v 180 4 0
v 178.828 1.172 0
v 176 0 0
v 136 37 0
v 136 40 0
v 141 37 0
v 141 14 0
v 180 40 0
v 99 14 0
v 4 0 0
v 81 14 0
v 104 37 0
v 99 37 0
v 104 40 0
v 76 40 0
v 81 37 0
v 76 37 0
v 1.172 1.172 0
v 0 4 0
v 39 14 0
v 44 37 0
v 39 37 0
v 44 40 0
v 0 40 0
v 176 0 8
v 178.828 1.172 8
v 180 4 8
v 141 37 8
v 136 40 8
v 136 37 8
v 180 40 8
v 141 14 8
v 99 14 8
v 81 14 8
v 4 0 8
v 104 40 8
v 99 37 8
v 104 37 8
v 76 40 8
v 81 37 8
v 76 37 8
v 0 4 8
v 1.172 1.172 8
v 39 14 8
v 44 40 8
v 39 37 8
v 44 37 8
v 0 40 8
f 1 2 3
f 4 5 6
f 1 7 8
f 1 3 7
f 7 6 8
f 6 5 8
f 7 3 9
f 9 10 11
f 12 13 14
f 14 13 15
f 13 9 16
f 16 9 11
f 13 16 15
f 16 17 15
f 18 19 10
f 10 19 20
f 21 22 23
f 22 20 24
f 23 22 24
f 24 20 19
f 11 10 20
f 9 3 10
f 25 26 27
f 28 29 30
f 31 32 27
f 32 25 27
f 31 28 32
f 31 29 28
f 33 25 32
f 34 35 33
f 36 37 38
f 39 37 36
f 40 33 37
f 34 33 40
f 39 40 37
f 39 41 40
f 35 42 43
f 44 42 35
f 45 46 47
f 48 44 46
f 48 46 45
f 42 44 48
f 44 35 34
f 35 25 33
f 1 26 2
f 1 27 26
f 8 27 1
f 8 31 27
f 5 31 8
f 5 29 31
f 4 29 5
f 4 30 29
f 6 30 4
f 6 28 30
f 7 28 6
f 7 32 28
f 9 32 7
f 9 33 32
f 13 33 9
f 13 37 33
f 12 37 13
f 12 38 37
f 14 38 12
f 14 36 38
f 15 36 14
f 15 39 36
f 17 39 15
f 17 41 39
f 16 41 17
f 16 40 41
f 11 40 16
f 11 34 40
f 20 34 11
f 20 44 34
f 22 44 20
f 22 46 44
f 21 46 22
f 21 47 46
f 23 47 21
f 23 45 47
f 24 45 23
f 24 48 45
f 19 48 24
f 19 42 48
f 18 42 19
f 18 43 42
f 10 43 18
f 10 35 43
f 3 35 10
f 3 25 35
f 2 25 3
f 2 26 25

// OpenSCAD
$fn = 32;

// ----------------------------------------------------------------------
// Oversize slot bar: 180 mm bar with 2 oversize windows
// ----------------------------------------------------------------------

// --- parameters (mm) ---
profile_height = 8;       // extrusion height
profile_points = 24;      // points of the closed outline

profile = [[0, 4], [1.172, 1.172], [4, 0], [176, 0], [178.828, 1.172], [180, 4], [180, 40], [136, 40], [136, 37], [141, 37], [141, 14], [99, 14], [99, 37], [104, 37], [104, 40], [76, 40], [76, 37], [81, 37], [81, 14], [39, 14], [39, 37], [44, 37], [44, 40], [0, 40]];  // single closed polygon, 24 points, counter clockwise

// --- the one profile operation ---
linear_extrude(height = profile_height) polygon(points = profile);
